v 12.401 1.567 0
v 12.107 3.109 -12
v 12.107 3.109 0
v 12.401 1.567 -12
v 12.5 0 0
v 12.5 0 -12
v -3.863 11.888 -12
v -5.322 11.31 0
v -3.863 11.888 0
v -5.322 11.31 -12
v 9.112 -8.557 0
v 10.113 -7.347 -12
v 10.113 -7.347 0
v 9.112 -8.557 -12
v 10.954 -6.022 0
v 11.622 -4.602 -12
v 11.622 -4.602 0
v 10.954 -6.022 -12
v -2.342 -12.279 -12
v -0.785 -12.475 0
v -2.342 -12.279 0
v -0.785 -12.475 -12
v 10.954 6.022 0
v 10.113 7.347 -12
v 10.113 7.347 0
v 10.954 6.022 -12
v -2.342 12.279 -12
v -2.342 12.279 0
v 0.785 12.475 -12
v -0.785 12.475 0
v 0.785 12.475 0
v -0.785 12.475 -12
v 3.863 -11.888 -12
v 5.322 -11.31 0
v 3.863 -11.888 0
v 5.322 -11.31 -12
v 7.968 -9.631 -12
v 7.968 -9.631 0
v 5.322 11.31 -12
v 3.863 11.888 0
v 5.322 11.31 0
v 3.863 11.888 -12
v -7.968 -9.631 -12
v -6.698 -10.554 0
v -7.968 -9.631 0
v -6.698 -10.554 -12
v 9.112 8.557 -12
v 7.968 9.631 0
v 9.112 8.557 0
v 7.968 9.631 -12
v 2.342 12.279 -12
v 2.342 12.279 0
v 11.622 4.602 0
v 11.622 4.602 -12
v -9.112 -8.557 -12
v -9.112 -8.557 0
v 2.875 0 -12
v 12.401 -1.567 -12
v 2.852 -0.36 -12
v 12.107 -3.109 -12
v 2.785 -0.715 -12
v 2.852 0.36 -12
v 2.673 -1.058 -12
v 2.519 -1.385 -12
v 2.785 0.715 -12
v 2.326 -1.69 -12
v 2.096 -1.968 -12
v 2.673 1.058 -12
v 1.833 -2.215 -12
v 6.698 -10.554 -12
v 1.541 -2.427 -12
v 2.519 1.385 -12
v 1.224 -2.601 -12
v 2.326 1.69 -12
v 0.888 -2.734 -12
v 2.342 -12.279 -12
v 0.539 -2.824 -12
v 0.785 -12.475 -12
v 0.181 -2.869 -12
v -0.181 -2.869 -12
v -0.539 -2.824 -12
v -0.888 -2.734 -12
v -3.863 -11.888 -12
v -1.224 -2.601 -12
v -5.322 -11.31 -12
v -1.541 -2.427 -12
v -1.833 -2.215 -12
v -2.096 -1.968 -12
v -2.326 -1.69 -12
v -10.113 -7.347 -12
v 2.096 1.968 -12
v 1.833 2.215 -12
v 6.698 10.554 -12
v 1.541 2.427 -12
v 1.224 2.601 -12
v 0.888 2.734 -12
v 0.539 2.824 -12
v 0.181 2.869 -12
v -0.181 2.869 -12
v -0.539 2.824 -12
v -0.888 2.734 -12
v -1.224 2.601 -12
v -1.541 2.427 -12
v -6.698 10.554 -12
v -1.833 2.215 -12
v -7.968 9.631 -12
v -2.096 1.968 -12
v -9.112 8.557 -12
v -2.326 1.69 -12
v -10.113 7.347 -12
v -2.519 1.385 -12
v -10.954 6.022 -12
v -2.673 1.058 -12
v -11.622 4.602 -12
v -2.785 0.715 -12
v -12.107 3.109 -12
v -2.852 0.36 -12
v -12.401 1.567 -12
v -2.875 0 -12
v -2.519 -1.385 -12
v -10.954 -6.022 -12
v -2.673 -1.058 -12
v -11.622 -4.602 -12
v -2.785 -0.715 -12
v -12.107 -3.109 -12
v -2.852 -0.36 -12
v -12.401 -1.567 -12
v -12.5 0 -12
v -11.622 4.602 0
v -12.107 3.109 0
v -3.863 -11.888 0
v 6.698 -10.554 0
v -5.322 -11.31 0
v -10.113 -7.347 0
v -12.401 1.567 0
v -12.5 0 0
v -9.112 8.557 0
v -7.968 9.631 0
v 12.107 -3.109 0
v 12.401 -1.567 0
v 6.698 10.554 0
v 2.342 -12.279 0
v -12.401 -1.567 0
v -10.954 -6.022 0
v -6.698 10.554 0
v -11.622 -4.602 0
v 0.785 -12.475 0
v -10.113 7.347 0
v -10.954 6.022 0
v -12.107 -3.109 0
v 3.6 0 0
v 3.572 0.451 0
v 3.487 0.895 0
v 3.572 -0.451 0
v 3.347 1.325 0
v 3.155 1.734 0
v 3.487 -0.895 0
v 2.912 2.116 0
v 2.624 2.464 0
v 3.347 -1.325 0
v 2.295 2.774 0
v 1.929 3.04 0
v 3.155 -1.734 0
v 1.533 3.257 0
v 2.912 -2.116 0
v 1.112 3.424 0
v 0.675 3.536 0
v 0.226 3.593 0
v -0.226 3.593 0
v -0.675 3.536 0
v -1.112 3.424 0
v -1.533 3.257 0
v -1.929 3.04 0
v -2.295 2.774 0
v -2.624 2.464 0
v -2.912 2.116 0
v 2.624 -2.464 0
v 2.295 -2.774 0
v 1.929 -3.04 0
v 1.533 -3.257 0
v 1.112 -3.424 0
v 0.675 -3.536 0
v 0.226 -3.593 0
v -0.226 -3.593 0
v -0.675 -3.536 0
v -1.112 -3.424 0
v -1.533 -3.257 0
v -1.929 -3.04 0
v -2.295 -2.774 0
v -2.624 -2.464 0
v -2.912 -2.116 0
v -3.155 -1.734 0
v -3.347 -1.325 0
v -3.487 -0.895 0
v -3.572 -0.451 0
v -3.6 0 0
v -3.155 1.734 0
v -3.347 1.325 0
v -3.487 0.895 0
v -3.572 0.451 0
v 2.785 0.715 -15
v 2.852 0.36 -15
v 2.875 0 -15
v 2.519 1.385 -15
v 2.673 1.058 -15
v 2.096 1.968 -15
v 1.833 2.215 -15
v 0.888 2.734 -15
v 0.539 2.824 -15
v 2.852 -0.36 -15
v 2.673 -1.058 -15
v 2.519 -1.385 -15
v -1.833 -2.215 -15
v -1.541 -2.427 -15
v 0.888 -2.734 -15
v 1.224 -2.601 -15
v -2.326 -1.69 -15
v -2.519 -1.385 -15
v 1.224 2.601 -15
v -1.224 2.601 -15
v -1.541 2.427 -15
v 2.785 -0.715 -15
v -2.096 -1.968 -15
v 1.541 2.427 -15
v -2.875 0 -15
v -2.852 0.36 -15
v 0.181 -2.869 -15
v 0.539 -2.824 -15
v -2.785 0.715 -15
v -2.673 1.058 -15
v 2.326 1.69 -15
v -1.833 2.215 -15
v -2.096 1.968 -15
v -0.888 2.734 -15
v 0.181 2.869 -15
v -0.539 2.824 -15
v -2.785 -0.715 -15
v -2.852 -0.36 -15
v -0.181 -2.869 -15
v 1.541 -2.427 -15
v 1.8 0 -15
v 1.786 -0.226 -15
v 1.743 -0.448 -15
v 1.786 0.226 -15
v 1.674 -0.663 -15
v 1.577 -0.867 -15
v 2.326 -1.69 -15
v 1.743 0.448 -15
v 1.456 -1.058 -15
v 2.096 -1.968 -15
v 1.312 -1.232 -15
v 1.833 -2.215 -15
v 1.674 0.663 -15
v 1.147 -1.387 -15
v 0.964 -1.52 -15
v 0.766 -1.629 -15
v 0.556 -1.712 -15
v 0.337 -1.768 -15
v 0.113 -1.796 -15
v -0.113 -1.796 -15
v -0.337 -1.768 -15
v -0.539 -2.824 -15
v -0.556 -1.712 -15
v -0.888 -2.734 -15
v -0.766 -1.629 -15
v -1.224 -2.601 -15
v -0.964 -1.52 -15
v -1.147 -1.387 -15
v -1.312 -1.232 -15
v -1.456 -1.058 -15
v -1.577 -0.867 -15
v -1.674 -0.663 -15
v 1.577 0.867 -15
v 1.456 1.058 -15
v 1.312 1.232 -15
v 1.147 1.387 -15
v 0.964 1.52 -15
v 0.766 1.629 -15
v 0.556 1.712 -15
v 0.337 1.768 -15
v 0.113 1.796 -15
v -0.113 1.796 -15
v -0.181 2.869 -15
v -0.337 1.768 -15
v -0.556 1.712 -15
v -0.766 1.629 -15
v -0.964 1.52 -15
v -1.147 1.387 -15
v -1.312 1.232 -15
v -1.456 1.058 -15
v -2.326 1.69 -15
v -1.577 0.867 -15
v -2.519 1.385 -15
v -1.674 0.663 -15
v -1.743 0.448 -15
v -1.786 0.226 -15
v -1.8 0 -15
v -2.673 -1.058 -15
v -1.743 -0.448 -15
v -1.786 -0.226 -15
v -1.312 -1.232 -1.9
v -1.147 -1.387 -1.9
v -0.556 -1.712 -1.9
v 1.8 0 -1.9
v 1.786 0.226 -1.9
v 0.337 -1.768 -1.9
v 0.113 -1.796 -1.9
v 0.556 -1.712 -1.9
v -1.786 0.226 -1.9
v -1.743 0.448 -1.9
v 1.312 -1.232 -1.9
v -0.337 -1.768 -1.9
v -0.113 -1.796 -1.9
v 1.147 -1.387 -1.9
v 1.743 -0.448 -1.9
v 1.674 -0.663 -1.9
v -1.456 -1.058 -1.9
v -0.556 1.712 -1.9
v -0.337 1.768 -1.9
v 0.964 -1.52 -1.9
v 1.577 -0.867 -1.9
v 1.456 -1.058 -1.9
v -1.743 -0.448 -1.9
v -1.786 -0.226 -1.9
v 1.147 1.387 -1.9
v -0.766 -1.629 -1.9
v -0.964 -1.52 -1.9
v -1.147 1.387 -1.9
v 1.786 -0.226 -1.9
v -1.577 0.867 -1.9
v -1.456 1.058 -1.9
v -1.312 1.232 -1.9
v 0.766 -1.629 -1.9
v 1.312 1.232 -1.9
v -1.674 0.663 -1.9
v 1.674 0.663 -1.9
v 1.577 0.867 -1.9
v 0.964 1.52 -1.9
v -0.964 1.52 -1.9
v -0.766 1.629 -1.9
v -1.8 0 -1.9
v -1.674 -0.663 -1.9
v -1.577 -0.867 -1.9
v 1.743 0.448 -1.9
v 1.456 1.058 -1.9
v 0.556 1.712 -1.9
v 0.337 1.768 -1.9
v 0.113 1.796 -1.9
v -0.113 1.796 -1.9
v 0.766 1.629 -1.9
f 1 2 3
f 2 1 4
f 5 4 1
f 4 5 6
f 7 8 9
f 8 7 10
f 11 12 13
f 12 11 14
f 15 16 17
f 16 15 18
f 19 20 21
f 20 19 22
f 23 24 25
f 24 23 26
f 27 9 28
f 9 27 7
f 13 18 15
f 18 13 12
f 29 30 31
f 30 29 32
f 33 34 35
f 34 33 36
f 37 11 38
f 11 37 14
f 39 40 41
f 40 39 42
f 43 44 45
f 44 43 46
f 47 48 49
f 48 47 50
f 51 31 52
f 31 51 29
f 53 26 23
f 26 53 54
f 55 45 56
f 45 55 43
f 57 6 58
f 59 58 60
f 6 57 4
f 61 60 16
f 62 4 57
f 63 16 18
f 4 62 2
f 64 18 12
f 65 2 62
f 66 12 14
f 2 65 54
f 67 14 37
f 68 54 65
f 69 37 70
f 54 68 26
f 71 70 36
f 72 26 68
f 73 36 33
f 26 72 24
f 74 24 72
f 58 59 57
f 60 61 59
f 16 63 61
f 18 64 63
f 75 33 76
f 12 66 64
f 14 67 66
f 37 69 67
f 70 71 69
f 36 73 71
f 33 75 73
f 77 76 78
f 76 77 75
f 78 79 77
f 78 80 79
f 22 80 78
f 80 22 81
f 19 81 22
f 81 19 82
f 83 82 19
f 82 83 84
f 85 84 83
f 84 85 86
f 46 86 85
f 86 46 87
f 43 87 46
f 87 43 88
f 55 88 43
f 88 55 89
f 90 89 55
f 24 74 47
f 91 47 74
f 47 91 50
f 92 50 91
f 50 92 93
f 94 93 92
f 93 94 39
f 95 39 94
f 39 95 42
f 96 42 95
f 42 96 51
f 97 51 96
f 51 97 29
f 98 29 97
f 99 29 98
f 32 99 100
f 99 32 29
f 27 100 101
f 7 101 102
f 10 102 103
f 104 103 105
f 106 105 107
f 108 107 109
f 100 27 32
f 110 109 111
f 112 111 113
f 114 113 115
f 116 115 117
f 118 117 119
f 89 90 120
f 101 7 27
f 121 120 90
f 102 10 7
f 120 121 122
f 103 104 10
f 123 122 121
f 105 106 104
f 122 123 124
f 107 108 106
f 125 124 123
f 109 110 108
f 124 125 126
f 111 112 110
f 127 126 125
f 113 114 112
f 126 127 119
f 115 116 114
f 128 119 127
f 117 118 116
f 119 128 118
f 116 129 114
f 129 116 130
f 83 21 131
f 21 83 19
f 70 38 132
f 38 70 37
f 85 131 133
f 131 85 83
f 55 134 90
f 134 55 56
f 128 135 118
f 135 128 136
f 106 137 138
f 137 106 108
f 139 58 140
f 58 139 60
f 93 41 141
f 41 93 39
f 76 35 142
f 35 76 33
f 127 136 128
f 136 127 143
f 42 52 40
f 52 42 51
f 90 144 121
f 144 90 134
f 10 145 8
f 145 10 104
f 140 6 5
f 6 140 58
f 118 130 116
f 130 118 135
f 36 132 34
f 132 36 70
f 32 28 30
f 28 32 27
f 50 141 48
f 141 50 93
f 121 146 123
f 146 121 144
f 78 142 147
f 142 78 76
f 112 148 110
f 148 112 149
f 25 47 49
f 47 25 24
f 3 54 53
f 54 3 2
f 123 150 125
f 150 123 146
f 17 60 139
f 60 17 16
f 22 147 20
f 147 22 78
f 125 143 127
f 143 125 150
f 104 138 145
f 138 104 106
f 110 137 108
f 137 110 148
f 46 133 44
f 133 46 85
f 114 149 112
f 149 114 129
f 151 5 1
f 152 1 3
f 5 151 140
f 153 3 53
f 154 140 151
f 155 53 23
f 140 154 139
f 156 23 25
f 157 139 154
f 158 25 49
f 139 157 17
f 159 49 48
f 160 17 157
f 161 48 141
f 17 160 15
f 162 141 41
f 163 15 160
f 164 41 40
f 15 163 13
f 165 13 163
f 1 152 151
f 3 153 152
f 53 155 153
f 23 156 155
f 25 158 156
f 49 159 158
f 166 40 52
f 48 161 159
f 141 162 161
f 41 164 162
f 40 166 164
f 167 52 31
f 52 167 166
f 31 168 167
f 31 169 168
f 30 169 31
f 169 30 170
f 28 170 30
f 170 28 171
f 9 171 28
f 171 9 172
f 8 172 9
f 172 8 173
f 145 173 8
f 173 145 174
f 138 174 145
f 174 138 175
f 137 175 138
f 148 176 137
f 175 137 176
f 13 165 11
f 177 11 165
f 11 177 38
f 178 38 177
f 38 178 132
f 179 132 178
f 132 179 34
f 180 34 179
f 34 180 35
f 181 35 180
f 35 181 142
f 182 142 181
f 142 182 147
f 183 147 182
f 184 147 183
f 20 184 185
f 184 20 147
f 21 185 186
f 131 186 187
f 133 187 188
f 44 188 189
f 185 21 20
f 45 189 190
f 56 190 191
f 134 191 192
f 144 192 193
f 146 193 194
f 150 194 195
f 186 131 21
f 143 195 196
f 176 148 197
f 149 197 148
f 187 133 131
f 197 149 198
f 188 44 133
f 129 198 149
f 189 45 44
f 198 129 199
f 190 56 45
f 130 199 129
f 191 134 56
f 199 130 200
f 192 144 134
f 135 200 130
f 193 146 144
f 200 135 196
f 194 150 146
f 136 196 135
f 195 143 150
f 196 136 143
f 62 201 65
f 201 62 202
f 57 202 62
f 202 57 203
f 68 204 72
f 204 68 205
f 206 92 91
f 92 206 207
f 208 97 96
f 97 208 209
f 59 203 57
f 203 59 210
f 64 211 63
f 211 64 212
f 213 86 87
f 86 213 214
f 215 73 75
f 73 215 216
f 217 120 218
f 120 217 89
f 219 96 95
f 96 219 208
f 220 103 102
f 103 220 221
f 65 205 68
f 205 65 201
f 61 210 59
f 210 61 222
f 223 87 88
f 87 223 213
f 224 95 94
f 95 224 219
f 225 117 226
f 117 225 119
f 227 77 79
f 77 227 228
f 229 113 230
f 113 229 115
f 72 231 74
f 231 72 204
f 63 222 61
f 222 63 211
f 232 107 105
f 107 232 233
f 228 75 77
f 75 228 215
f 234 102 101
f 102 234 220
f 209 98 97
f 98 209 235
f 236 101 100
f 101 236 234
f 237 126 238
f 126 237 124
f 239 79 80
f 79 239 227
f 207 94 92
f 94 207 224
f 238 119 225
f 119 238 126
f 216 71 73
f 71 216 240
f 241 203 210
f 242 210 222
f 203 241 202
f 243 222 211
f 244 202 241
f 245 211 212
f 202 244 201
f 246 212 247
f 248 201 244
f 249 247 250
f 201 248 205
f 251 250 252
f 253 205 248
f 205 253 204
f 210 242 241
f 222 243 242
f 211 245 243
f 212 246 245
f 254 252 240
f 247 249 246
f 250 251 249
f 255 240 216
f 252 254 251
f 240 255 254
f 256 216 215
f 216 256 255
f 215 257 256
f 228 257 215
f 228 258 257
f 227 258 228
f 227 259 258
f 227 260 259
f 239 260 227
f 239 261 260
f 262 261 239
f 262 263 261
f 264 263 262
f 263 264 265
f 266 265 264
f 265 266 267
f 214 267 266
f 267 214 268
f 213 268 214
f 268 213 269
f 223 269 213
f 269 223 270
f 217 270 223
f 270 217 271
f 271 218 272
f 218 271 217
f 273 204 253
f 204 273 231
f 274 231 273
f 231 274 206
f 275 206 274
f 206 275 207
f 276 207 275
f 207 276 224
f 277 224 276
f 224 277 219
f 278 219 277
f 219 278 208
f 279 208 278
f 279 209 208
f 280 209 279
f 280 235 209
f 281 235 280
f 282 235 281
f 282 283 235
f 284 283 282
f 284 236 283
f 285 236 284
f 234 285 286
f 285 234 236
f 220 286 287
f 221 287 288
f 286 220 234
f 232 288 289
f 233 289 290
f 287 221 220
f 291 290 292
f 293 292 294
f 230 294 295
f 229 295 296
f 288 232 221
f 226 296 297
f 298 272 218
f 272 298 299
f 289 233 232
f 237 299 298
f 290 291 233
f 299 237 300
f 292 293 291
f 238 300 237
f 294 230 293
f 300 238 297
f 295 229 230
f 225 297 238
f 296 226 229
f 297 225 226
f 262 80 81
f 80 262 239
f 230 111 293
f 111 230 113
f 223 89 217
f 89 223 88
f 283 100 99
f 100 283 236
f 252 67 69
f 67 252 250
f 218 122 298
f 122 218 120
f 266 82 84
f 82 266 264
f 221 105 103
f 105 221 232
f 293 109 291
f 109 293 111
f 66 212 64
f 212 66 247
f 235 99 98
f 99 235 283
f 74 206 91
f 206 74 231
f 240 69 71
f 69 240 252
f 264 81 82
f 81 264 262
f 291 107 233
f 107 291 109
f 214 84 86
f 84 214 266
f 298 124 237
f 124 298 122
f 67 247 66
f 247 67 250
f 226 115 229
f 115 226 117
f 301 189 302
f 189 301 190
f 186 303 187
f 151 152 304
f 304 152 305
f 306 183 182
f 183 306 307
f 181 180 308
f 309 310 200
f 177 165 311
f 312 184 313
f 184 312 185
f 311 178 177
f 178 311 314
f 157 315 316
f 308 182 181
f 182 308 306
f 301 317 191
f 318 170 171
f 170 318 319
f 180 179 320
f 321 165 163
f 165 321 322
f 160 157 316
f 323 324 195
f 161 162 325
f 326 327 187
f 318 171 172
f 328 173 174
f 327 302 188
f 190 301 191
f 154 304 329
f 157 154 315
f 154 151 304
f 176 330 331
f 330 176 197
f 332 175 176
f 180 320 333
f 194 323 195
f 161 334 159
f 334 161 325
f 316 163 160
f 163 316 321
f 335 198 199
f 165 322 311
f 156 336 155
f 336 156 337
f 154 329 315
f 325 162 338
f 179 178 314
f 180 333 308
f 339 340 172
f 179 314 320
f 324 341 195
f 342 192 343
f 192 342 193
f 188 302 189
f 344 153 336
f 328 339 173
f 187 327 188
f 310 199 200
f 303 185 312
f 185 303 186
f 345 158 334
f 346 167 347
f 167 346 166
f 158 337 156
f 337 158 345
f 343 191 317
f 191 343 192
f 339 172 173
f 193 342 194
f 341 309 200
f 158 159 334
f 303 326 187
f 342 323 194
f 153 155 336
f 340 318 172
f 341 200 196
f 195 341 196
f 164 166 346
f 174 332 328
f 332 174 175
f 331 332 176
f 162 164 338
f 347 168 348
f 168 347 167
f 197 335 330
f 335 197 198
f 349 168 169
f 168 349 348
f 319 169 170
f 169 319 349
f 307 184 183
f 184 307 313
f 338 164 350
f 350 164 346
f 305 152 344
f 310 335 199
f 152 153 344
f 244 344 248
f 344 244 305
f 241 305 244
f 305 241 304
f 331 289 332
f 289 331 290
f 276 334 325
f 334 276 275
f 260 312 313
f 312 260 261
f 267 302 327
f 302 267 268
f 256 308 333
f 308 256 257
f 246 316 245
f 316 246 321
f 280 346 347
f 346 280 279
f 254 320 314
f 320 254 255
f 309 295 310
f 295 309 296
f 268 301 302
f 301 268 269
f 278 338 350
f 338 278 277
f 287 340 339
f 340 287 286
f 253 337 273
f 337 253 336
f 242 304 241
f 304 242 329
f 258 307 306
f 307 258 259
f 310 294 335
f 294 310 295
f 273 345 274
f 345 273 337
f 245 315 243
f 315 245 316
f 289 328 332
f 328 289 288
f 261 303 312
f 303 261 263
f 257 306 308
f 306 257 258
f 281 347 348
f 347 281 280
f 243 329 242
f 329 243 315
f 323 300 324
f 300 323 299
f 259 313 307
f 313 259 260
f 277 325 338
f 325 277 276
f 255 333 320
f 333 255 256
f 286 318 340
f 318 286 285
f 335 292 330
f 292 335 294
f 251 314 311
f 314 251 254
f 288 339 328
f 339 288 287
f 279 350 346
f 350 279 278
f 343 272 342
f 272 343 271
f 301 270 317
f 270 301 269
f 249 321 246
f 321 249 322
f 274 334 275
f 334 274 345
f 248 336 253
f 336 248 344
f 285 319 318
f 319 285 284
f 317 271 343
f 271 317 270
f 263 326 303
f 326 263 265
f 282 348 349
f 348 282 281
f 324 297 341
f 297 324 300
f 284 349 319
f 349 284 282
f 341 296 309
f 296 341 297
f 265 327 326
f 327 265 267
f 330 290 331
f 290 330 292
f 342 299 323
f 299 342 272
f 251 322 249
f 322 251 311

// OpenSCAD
$fn = 50;

difference() {
	union() {
		translate(v = [0, 0, -12.0]) {
			cylinder(h = 12, r = 12.5);
		}
		#translate(v = [0, 0, -15.0]) {
			cylinder(h = 15, r = 2.875);
		}
	}
	union() {
		translate(v = [0, 0, 0]) {
			rotate(a = [0, 0, 0]) {
				difference() {
					union() {
						translate(v = [0, 0, -15.0]) {
							cylinder(h = 15, r = 1.5);
						}
						translate(v = [0, 0, -1.9]) {
							cylinder(h = 1.9, r1 = 1.8, r2 = 3.6);
						}
						translate(v = [0, 0, -15.0]) {
							cylinder(h = 15, r = 1.8);
						}
						translate(v = [0, 0, -15.0]) {
							cylinder(h = 15, r = 1.5);
						}
					}
					union();
				}
			}
		}
	}
}
